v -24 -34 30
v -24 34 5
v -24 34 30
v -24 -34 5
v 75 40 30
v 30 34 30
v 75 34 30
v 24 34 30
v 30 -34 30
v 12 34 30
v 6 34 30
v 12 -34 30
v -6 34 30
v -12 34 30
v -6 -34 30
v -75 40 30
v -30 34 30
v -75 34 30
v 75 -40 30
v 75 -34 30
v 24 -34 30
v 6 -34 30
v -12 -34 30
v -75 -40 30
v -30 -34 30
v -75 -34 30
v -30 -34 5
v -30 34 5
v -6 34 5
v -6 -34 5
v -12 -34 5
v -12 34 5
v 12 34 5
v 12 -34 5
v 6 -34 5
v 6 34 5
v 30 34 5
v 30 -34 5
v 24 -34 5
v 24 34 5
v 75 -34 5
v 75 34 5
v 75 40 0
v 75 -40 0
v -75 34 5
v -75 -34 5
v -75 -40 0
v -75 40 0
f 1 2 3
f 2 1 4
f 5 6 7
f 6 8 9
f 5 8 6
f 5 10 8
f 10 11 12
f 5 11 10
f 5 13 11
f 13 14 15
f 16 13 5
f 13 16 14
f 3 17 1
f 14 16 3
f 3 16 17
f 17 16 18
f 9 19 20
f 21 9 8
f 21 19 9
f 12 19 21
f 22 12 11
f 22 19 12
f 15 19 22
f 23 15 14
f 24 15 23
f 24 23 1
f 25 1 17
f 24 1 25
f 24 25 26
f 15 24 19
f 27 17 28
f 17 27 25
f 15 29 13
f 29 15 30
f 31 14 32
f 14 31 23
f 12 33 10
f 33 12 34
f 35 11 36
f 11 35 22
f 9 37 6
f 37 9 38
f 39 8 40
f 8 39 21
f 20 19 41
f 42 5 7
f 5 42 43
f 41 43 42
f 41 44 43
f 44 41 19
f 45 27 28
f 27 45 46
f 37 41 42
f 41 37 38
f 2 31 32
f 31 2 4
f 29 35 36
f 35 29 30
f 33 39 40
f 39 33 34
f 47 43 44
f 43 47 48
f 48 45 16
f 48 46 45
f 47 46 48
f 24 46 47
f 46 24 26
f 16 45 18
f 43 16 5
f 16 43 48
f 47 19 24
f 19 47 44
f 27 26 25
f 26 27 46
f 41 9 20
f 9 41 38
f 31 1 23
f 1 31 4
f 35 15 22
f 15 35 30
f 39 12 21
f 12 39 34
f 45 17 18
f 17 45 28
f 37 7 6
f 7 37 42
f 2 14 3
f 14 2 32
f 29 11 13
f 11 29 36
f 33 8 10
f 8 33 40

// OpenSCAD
$fn = 32;

// ----------------------------------------------------------------------
// Rib frame 150 x 80 x 30
// 4 ribs at 18 mm pitch
// ----------------------------------------------------------------------

// --- parameters (mm) ---
frame = [150, 80, 5];  // base plate size (x, y, z)
rail_w = 6;            // side rail width
ribs = 4;              // number of ribs
rib_t = 6;             // rib thickness
rib_h = 25;            // rib height above the base plate
pitch = 18;            // pitch between rib centres

// --- derived feature positions (mm) ---
span = (ribs - 1) * pitch;          // = 54   distance between the outer ribs
origin_x = -span / 2;               // = -27   X of the first rib
rib_len = frame[1] - 2 * rail_w + 2;  // = 70   rib length, 1 mm into each rail
feature_centers = [
  [origin_x + 0 * pitch, 0],
  [origin_x + 1 * pitch, 0],
  [origin_x + 2 * pitch, 0],
  [origin_x + 3 * pitch, 0]
];   // rib centre line, drives the rib loop

// base plate, two side rails, then the ribs read straight off feature_centers
union() {
  translate([-frame[0] / 2, -frame[1] / 2, 0]) cube(frame);
  translate([-frame[0] / 2, -frame[1] / 2, 0]) cube([frame[0], rail_w, frame[2] + rib_h]);
  translate([-frame[0] / 2, frame[1] / 2 - rail_w, 0]) cube([frame[0], rail_w, frame[2] + rib_h]);
  for (centre = feature_centers)
    translate([centre[0] - rib_t / 2, centre[1] - rib_len / 2, frame[2] - 1])
      cube([rib_t, rib_len, rib_h + 1]);
}
